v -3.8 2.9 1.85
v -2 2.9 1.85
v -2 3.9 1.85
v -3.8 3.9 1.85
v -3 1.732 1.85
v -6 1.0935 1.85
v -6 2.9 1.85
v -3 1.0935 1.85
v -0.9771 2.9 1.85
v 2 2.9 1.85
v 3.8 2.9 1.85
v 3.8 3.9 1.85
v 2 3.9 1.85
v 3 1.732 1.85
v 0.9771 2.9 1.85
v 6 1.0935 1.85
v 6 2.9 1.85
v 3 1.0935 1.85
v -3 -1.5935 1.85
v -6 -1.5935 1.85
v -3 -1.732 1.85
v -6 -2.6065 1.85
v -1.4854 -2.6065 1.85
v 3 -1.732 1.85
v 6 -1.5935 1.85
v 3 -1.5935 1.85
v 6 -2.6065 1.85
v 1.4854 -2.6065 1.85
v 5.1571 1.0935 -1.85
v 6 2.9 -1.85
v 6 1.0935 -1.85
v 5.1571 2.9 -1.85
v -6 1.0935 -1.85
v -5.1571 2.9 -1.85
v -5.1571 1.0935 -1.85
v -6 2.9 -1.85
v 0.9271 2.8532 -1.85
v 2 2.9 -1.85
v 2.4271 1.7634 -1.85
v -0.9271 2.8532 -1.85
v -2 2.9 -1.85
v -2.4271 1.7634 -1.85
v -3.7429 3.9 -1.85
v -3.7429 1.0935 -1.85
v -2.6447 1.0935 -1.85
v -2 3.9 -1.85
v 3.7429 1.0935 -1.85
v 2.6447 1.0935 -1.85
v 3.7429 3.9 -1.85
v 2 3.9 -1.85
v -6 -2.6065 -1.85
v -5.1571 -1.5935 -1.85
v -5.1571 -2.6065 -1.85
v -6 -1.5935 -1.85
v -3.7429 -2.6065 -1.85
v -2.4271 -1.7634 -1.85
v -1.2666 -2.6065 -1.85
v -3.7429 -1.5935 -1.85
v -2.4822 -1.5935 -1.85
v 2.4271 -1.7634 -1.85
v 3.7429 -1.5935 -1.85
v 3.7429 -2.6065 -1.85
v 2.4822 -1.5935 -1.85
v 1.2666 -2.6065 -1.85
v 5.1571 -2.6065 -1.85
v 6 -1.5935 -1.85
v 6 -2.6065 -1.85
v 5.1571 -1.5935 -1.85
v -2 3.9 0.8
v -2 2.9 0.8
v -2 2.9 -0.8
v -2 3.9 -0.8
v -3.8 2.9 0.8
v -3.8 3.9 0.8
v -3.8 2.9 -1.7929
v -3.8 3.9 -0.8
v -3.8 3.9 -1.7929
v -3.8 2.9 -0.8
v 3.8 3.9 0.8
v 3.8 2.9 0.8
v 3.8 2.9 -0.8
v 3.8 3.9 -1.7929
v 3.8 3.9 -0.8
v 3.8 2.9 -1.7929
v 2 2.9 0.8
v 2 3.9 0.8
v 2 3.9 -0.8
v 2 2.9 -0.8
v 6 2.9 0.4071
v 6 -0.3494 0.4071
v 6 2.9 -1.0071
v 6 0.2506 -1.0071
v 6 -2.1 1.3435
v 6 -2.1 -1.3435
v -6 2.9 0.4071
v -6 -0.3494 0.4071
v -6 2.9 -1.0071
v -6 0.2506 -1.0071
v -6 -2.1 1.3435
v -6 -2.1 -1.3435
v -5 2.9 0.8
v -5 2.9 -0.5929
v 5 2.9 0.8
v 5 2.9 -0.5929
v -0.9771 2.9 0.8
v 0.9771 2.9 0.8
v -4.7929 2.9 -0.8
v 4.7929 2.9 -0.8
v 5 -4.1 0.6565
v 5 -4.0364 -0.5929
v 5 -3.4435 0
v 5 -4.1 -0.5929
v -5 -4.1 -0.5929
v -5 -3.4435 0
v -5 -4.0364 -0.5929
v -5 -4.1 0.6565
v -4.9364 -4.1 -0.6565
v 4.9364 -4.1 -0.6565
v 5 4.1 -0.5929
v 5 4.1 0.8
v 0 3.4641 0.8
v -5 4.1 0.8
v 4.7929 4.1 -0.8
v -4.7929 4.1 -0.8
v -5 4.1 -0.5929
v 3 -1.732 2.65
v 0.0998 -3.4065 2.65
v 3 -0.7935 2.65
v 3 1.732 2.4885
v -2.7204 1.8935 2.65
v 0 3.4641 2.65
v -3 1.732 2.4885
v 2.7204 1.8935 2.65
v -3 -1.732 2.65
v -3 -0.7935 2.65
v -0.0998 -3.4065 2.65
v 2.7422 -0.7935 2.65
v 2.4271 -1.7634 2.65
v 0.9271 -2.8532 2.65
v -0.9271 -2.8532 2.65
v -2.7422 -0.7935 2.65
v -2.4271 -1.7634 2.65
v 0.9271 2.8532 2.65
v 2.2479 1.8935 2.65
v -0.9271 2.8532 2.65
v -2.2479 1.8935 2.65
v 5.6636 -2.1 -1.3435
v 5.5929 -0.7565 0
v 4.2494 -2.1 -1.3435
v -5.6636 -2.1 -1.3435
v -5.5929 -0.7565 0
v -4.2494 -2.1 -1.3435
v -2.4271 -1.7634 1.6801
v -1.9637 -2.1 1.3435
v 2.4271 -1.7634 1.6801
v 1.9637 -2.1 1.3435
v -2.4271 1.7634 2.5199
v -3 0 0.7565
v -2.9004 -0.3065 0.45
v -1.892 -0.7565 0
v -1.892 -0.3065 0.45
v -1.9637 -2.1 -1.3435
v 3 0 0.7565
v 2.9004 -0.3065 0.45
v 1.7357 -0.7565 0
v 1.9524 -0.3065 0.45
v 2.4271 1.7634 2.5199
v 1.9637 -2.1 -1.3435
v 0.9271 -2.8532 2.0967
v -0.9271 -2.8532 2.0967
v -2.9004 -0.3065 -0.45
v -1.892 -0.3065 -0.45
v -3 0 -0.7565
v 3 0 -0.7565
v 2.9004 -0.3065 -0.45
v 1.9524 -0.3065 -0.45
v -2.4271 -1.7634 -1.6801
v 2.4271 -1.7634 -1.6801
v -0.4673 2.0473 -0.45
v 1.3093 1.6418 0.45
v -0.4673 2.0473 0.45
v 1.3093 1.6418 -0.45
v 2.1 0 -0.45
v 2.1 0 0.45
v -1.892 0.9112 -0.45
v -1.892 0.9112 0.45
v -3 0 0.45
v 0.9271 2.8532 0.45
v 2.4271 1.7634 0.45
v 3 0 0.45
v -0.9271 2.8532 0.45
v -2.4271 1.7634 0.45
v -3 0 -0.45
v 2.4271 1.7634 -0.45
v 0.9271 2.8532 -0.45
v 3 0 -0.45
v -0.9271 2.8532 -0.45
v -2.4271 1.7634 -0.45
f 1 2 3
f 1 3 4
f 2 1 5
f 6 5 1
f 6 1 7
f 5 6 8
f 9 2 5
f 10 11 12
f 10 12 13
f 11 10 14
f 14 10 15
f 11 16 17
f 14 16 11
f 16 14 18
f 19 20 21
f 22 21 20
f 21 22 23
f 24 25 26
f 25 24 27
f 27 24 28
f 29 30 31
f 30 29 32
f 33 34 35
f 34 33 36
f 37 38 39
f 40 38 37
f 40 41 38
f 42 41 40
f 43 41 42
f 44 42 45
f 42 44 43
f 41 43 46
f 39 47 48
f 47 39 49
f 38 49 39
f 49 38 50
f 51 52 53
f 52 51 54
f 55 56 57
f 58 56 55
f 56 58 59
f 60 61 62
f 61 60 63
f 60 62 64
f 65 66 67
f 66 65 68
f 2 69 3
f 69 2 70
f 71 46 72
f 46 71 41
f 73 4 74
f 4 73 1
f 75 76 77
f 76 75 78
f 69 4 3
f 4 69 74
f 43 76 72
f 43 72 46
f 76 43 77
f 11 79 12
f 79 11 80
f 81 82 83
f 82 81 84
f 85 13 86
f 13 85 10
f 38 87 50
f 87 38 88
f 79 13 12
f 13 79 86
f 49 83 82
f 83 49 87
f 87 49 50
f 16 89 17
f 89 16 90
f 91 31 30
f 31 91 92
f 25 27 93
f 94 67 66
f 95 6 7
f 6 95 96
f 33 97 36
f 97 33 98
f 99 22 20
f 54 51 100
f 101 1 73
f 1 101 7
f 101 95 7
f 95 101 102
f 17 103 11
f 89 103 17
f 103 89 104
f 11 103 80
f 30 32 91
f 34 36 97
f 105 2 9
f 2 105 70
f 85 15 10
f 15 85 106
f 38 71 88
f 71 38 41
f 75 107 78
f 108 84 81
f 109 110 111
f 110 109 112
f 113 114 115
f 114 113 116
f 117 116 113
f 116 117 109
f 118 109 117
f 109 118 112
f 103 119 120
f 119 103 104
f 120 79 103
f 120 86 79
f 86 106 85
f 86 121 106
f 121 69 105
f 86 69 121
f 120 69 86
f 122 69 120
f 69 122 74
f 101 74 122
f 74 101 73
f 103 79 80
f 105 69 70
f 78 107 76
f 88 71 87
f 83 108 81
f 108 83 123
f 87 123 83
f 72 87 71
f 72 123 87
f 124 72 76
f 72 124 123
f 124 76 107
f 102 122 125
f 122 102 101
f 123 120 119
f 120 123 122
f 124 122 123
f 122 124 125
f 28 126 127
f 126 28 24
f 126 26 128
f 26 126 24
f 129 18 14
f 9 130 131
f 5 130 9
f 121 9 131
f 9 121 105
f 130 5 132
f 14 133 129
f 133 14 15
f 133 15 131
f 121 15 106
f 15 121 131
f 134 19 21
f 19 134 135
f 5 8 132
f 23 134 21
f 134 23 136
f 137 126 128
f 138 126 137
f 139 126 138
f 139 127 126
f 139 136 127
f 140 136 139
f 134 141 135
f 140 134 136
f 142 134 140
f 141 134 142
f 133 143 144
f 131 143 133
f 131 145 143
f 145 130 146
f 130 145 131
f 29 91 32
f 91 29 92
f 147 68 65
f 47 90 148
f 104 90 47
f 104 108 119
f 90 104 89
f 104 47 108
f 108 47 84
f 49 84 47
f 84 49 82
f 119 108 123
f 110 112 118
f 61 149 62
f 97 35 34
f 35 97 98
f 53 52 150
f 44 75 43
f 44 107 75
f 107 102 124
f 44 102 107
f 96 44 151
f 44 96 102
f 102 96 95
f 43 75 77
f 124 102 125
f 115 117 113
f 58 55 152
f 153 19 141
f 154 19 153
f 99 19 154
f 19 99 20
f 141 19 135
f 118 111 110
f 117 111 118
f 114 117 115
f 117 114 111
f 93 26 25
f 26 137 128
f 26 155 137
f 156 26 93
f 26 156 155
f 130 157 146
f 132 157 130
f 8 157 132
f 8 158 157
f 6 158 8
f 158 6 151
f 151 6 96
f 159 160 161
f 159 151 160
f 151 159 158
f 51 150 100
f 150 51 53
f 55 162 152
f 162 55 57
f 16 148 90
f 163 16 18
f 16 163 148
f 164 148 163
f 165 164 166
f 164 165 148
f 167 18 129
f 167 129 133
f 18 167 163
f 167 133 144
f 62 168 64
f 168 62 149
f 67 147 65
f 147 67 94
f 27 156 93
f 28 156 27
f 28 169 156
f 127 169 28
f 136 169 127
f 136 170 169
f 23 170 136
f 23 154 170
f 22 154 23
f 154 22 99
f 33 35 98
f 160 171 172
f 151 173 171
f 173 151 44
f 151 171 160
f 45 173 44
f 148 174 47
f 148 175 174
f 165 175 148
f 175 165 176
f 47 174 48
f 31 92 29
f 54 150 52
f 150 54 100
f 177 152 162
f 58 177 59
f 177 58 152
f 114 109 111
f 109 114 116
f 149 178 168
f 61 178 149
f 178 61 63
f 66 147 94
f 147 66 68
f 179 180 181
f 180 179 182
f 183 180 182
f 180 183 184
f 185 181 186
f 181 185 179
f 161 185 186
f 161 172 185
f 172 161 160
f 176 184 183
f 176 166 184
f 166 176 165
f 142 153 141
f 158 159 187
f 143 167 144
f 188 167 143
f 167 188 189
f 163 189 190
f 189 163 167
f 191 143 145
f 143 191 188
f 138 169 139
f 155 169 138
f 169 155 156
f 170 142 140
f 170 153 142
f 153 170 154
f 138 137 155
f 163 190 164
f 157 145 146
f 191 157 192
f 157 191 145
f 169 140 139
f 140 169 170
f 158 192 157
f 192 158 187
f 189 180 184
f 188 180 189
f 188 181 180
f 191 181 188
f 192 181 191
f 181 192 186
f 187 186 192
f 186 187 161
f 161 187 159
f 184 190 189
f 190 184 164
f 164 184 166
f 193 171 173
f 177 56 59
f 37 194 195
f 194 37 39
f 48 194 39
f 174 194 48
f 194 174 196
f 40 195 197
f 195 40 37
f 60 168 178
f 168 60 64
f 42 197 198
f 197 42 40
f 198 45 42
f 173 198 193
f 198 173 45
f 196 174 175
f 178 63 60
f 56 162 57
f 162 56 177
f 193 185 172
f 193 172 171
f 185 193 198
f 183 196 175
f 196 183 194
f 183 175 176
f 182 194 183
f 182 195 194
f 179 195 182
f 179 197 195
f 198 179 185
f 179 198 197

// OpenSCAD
// Parameters
screw_thread_diameter_mm = 5; //[2.5:10:0.1]
screw_thread_pitch_mm = 0.8; //[0.4:1.6:0.05]
across_flats_mm = 6; //[3:12:0.1]
thickness_mm = 3.7; //[1.85:7.4:0.1]
thread_engagement_mm = 3.7; //[1.85:7.4:0.1]
hole_minor_diameter_mm = 4.2; //[3.5:4.8:0.05]
hole_clearance_if_unthreaded_mm = 5.5; //[5:6.5:0.1]
edge_chamfer_mm = 0.3; //[0.1:0.8:0.05]
corner_fillet_mm = 0.2; //[0:1:0.05]
t_slot_nominal_width_mm = 10; //[5:20:0.5]
t_slot_neck_width_mm = 6; //[3:12:0.5]
t_slot_depth_mm = 6; //[3:12:0.5]
t_slot_wing_width_mm = 2; //[1:4:0.1]
t_slot_wing_thickness_mm = 1.6; //[0.8:3.2:0.1]
insertion_lead_in_length_mm = 1; //[0.5:3:0.1]
overlap_mm = 0.8; //[0.2:2:0.1]
body_length_mm = 12; //[6:24:0.5]
body_width_mm = 5.8; //[3:12:0.1]
wing_length_mm = 10; //[5:20:0.5]
thread_relief_diameter_mm = 6; //[5:10:0.1]
thread_relief_depth_mm = 0.6; //[0.2:2:0.1]
hex_prism_height_mm = 2.2; //[1:4.4:0.1]

// Extra overlap to guarantee attachment of the small corner wedge/tab features
attach_overlap_mm = 1.2; // (1-2mm) guaranteed intersection

// Hexagonal prism calculation
module hex_profile() {
  rotate([0, 0, 30]) {
    cylinder(r=(across_flats_mm/2)/cos(30), h=hex_prism_height_mm, center=true, $fn=6);
  }
}

// Small side clip/tab pieces (one on each side) - FIXED to be physically attached.
// These are placed on the OUTER sides of the wings (±Y) and overlap into the wing by attach_overlap_mm.
// Also spans full thickness so it cannot float above/below after chamfers.
module side_clips() {
  clip_len_x = 1.8;                         // small along X
  clip_w_y   = t_slot_wing_width_mm;        // matches wing width
  clip_h_z   = thickness_mm;                // span full thickness to avoid Z-floating

  // Put clips near the ends of the wings, but still within wing length.
  // Ensure intersection with wing by pushing inward in X by attach_overlap_mm.
  x_pos = wing_length_mm/2 - clip_len_x/2 - attach_overlap_mm;

  // Place on the OUTER face of each wing and overlap into the wing by attach_overlap_mm.
  // Wing center is at ±(body_width/2 + wing_w/2 - overlap).
  // Outer face of wing is at that center ± wing_w/2.
  wing_center_y = body_width_mm/2 + t_slot_wing_width_mm/2 - overlap_mm;
  y_pos = wing_center_y + t_slot_wing_width_mm/2 - attach_overlap_mm;

  for (sx = [-1, 1])
    for (sy = [-1, 1])
      translate([sx*x_pos, sy*y_pos, 0])
        cube([clip_len_x, clip_w_y, clip_h_z], center=true);
}

// T-slot nut with wings
module t_slot_nut() {
  union() {
    // Center body
    cube([body_length_mm, body_width_mm, thickness_mm], center=true);

    // Wings (ensure overlap into body)
    translate([0, -(body_width_mm/2 + t_slot_wing_width_mm/2 - overlap_mm), 0])
      cube([wing_length_mm, t_slot_wing_width_mm, t_slot_wing_thickness_mm], center=true);

    translate([0,  (body_width_mm/2 + t_slot_wing_width_mm/2 - overlap_mm), 0])
      cube([wing_length_mm, t_slot_wing_width_mm, t_slot_wing_thickness_mm], center=true);

    // Side clip/tab pieces (now guaranteed attached with 1-2mm overlap into wings)
    side_clips();

    // Hex profile (ensure overlap into body)
    translate([0, 0, (thickness_mm/2 - hex_prism_height_mm/2 + overlap_mm)])
      hex_profile();
  }
}

// Final nut with chamfers and holes
module nut_and_washer() {
  difference() {
    t_slot_nut();

    // Lead-in chamfers (cut from ends)
    translate([ body_length_mm/2 - insertion_lead_in_length_mm/2 + overlap_mm, 0, 0])
      rotate([0, 45, 0])
      cube([insertion_lead_in_length_mm, body_width_mm + 2*t_slot_wing_width_mm + 4*overlap_mm, thickness_mm + 4*overlap_mm], center=true);

    translate([-body_length_mm/2 + insertion_lead_in_length_mm/2 - overlap_mm, 0, 0])
      rotate([0, -45, 0])
      cube([insertion_lead_in_length_mm, body_width_mm + 2*t_slot_wing_width_mm + 4*overlap_mm, thickness_mm + 4*overlap_mm], center=true);

    // Top/bottom edge chamfers
    translate([0, 0,  thickness_mm/2 - (edge_chamfer_mm + overlap_mm)/2 + overlap_mm])
      rotate([45, 0, 0])
      cube([body_length_mm + 4*overlap_mm, body_width_mm + 2*t_slot_wing_width_mm + 4*overlap_mm, edge_chamfer_mm + 2*overlap_mm], center=true);

    translate([0, 0, -thickness_mm/2 + (edge_chamfer_mm + overlap_mm)/2 - overlap_mm])
      rotate([-45, 0, 0])
      cube([body_length_mm + 4*overlap_mm, body_width_mm + 2*t_slot_wing_width_mm + 4*overlap_mm, edge_chamfer_mm + 2*overlap_mm], center=true);

    // Threaded hole
    cylinder(r=hole_minor_diameter_mm/2, h=thickness_mm + 4*overlap_mm, center=true);

    // Thread relief/counterbore top
    translate([0, 0,  thickness_mm/2 - (thread_relief_depth_mm)/2])
      cylinder(r=thread_relief_diameter_mm/2, h=thread_relief_depth_mm + 2*overlap_mm, center=true);

    // Thread relief/counterbore bottom
    translate([0, 0, -thickness_mm/2 + (thread_relief_depth_mm)/2])
      cylinder(r=thread_relief_diameter_mm/2, h=thread_relief_depth_mm + 2*overlap_mm, center=true);
  }
}

// Assembly
module assembly() {
  nut_and_washer();
}

assembly();
